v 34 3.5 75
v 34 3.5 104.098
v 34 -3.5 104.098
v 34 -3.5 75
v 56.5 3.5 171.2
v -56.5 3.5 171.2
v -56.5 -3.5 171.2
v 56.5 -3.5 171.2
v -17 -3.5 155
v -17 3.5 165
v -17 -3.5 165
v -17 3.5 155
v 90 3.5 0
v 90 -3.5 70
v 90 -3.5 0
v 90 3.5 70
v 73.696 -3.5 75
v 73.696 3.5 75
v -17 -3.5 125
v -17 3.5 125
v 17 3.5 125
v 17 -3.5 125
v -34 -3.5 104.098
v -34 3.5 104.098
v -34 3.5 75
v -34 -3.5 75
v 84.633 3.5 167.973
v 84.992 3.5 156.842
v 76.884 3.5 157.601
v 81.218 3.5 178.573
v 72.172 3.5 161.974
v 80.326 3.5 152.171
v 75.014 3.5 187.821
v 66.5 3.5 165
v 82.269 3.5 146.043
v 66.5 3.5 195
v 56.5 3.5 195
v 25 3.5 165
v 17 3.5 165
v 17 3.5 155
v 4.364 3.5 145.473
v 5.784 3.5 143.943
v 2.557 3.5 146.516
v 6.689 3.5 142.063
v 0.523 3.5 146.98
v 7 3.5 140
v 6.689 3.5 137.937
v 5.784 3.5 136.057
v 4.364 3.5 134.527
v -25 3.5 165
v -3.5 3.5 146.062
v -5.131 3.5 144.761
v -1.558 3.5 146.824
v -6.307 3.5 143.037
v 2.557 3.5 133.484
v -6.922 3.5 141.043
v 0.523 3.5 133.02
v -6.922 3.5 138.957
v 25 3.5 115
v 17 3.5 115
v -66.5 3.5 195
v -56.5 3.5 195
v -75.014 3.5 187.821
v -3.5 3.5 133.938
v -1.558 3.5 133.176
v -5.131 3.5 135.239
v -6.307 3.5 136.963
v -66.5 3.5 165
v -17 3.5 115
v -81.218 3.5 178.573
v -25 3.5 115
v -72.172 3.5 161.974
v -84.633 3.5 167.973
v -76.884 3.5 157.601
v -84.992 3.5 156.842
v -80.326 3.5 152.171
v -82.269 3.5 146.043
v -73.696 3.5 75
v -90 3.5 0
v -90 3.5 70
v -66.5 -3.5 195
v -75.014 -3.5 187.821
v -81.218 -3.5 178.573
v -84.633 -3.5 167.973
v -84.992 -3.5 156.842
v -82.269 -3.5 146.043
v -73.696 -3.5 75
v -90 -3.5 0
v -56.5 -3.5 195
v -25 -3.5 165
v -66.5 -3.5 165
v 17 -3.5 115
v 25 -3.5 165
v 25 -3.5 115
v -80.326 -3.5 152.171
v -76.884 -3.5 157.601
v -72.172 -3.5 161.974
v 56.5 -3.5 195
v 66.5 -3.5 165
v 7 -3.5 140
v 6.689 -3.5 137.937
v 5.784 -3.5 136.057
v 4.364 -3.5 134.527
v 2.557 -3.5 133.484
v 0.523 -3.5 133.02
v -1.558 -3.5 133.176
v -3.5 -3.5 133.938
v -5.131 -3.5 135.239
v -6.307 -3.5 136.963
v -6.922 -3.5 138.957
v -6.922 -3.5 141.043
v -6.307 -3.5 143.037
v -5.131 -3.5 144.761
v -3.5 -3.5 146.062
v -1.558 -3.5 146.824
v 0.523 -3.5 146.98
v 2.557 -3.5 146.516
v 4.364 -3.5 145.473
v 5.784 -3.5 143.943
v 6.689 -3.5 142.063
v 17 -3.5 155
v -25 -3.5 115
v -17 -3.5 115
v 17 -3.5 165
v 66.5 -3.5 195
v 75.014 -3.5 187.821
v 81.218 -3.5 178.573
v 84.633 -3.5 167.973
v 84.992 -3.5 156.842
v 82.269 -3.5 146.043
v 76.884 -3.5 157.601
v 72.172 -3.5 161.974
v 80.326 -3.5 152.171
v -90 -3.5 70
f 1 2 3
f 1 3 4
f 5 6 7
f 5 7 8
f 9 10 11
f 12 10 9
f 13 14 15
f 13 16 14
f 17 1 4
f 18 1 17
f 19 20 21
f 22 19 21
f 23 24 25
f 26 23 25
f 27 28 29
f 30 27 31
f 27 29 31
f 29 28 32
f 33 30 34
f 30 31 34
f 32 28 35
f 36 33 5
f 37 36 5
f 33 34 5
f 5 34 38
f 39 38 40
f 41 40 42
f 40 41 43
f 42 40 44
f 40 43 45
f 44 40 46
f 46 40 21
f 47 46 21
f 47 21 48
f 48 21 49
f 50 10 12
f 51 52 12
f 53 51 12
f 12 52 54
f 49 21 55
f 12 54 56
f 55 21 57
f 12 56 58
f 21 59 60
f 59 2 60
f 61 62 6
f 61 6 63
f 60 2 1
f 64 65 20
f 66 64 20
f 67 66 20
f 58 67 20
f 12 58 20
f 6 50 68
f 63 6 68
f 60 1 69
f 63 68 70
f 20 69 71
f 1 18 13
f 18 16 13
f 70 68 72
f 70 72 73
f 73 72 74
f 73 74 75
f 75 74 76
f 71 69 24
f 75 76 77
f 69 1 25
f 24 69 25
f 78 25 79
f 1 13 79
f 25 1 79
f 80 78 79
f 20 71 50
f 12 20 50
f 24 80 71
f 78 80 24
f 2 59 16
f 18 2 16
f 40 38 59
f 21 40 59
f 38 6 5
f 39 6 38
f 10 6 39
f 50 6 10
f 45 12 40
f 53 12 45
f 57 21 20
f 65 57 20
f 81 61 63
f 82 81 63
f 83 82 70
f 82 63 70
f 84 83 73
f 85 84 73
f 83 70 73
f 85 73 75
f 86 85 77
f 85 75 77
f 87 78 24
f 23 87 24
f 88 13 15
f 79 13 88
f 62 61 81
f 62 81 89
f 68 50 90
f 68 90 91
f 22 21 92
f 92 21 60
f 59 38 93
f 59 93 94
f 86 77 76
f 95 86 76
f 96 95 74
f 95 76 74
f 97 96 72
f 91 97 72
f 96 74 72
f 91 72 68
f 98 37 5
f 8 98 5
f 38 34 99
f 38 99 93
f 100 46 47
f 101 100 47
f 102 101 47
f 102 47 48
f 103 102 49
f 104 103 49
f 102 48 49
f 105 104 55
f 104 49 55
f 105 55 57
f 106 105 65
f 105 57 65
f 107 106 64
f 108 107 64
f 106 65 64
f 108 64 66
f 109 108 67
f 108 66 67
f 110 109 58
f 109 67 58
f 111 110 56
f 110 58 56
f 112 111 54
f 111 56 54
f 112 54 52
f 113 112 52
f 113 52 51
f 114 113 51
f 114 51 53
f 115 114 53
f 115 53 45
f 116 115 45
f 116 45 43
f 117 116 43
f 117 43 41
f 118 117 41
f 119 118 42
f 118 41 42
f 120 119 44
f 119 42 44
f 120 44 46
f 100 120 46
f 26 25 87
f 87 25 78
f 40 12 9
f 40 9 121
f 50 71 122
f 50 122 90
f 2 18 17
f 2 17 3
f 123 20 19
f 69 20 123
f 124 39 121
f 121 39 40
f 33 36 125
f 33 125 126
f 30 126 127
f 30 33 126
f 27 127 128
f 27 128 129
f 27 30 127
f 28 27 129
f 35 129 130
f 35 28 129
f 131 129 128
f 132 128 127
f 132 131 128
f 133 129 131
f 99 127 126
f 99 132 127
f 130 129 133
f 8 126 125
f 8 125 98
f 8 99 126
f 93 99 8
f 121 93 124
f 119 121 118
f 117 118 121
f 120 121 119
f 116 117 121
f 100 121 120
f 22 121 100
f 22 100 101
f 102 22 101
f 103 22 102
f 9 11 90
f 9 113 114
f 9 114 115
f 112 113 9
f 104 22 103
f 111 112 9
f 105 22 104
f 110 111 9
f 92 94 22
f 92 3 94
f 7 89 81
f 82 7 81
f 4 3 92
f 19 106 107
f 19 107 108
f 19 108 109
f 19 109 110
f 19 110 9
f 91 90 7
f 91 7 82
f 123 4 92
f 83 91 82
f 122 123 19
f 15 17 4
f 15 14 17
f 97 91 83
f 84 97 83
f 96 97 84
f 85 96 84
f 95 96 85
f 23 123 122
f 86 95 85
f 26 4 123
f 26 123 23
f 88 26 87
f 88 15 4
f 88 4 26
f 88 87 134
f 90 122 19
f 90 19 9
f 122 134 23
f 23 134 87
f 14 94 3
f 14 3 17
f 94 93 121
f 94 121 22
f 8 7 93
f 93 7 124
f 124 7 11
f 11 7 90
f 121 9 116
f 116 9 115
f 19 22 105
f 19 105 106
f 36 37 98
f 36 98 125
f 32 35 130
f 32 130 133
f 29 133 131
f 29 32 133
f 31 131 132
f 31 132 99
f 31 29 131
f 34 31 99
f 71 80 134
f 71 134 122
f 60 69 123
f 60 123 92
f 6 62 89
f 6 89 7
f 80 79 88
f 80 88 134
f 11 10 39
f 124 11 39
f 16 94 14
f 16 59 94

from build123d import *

# Parameters (mm, degrees)
BOSS_EXTRUDE1_DEPTH = 3.5
BOSS_EXTRUDE2_DEPTH = 7
SKETCH6_W           = 34
SKETCH6_H           = 10
CUT_EXTRUDE1_DEPTH  = 7
SKETCH7_R           = 7
CUT_EXTRUDE2_DEPTH  = 7
CUT_EXTRUDE3_DEPTH  = 7
SKETCH11_W          = 113
SKETCH11_H          = 23.8
CUT_EXTRUDE4_DEPTH  = 7


with BuildPart() as part:
    # Sketch1 → Boss-Extrude1 (new body, symmetric)
    with BuildSketch(Plane(origin=(0, 0, 0), x_dir=(1, 0, 0), z_dir=(0, 1, 0))):
        Polygon((90, 0), (-90, 0), (-90, -70), (-25, -115), (-25, -165), (-66.5, -165), (-66.5, -195), (66.5, -195), (66.5, -165), (25, -165), (25, -115), (90, -70), align=None)
    extrude(amount=BOSS_EXTRUDE1_DEPTH, both=True)

    # Sketch2 → Boss-Extrude2 (add)
    with BuildSketch(Plane(origin=(0, 3.5, 0), x_dir=(1, 0, 0), z_dir=(0, 1, 0))):
        with BuildLine():
            Line((-66.5, -165), (-66.5, -195))
            ThreePointArc((-66.5, -195), (-83.296215978, -173.392103188), (-82.268838739, -146.043271918))
            ThreePointArc((-82.268838739, -146.043271918), (-76.884146381, -157.600992268), (-66.5, -165))
        make_face()
        with BuildLine():
            Line((66.5, -165), (66.5, -195))
            ThreePointArc((66.5, -195), (83.296215978, -173.392103188), (82.268838739, -146.043271918))
            ThreePointArc((82.268838739, -146.043271918), (76.884146381, -157.600992268), (66.5, -165))
        make_face()
    extrude(amount=-BOSS_EXTRUDE2_DEPTH)

    # Sketch6 → Cut-Extrude1 (cut)
    with BuildSketch(Plane(origin=(0, 3.5, 0), x_dir=(1, 0, 0), z_dir=(0, 1, 0))):
        with Locations((0, -160)):
            Rectangle(SKETCH6_W, SKETCH6_H)
        with Locations((0, -120)):
            Rectangle(SKETCH6_W, SKETCH6_H)
    extrude(amount=-CUT_EXTRUDE1_DEPTH, mode=Mode.SUBTRACT)

    # Sketch7 → Cut-Extrude2 (cut)
    with BuildSketch(Plane(origin=(0, 3.5, 0), x_dir=(1, 0, 0), z_dir=(0, 1, 0))):
        with Locations((0, -140)):
            Circle(SKETCH7_R)
    extrude(amount=-CUT_EXTRUDE2_DEPTH, mode=Mode.SUBTRACT)

    # Sketch9 → Cut-Extrude3 (cut)
    with BuildSketch(Plane(origin=(0, 3.5, 0), x_dir=(1, 0, 0), z_dir=(0, 1, 0))):
        Polygon((-34, -75), (-73.695942788, -75), (-34, -104.097660068), align=None)
        Polygon((34, -104.097660068), (34, -75), (73.695942788, -75), align=None)
    extrude(amount=-CUT_EXTRUDE3_DEPTH, mode=Mode.SUBTRACT)

    # Sketch11 → Cut-Extrude4 (cut)
    with BuildSketch(Plane(origin=(0, 3.5, 0), x_dir=(1, 0, 0), z_dir=(0, 1, 0))):
        with Locations((0, -183.1)):
            Rectangle(SKETCH11_W, SKETCH11_H)
    extrude(amount=-CUT_EXTRUDE4_DEPTH, mode=Mode.SUBTRACT)


solid = part.part
